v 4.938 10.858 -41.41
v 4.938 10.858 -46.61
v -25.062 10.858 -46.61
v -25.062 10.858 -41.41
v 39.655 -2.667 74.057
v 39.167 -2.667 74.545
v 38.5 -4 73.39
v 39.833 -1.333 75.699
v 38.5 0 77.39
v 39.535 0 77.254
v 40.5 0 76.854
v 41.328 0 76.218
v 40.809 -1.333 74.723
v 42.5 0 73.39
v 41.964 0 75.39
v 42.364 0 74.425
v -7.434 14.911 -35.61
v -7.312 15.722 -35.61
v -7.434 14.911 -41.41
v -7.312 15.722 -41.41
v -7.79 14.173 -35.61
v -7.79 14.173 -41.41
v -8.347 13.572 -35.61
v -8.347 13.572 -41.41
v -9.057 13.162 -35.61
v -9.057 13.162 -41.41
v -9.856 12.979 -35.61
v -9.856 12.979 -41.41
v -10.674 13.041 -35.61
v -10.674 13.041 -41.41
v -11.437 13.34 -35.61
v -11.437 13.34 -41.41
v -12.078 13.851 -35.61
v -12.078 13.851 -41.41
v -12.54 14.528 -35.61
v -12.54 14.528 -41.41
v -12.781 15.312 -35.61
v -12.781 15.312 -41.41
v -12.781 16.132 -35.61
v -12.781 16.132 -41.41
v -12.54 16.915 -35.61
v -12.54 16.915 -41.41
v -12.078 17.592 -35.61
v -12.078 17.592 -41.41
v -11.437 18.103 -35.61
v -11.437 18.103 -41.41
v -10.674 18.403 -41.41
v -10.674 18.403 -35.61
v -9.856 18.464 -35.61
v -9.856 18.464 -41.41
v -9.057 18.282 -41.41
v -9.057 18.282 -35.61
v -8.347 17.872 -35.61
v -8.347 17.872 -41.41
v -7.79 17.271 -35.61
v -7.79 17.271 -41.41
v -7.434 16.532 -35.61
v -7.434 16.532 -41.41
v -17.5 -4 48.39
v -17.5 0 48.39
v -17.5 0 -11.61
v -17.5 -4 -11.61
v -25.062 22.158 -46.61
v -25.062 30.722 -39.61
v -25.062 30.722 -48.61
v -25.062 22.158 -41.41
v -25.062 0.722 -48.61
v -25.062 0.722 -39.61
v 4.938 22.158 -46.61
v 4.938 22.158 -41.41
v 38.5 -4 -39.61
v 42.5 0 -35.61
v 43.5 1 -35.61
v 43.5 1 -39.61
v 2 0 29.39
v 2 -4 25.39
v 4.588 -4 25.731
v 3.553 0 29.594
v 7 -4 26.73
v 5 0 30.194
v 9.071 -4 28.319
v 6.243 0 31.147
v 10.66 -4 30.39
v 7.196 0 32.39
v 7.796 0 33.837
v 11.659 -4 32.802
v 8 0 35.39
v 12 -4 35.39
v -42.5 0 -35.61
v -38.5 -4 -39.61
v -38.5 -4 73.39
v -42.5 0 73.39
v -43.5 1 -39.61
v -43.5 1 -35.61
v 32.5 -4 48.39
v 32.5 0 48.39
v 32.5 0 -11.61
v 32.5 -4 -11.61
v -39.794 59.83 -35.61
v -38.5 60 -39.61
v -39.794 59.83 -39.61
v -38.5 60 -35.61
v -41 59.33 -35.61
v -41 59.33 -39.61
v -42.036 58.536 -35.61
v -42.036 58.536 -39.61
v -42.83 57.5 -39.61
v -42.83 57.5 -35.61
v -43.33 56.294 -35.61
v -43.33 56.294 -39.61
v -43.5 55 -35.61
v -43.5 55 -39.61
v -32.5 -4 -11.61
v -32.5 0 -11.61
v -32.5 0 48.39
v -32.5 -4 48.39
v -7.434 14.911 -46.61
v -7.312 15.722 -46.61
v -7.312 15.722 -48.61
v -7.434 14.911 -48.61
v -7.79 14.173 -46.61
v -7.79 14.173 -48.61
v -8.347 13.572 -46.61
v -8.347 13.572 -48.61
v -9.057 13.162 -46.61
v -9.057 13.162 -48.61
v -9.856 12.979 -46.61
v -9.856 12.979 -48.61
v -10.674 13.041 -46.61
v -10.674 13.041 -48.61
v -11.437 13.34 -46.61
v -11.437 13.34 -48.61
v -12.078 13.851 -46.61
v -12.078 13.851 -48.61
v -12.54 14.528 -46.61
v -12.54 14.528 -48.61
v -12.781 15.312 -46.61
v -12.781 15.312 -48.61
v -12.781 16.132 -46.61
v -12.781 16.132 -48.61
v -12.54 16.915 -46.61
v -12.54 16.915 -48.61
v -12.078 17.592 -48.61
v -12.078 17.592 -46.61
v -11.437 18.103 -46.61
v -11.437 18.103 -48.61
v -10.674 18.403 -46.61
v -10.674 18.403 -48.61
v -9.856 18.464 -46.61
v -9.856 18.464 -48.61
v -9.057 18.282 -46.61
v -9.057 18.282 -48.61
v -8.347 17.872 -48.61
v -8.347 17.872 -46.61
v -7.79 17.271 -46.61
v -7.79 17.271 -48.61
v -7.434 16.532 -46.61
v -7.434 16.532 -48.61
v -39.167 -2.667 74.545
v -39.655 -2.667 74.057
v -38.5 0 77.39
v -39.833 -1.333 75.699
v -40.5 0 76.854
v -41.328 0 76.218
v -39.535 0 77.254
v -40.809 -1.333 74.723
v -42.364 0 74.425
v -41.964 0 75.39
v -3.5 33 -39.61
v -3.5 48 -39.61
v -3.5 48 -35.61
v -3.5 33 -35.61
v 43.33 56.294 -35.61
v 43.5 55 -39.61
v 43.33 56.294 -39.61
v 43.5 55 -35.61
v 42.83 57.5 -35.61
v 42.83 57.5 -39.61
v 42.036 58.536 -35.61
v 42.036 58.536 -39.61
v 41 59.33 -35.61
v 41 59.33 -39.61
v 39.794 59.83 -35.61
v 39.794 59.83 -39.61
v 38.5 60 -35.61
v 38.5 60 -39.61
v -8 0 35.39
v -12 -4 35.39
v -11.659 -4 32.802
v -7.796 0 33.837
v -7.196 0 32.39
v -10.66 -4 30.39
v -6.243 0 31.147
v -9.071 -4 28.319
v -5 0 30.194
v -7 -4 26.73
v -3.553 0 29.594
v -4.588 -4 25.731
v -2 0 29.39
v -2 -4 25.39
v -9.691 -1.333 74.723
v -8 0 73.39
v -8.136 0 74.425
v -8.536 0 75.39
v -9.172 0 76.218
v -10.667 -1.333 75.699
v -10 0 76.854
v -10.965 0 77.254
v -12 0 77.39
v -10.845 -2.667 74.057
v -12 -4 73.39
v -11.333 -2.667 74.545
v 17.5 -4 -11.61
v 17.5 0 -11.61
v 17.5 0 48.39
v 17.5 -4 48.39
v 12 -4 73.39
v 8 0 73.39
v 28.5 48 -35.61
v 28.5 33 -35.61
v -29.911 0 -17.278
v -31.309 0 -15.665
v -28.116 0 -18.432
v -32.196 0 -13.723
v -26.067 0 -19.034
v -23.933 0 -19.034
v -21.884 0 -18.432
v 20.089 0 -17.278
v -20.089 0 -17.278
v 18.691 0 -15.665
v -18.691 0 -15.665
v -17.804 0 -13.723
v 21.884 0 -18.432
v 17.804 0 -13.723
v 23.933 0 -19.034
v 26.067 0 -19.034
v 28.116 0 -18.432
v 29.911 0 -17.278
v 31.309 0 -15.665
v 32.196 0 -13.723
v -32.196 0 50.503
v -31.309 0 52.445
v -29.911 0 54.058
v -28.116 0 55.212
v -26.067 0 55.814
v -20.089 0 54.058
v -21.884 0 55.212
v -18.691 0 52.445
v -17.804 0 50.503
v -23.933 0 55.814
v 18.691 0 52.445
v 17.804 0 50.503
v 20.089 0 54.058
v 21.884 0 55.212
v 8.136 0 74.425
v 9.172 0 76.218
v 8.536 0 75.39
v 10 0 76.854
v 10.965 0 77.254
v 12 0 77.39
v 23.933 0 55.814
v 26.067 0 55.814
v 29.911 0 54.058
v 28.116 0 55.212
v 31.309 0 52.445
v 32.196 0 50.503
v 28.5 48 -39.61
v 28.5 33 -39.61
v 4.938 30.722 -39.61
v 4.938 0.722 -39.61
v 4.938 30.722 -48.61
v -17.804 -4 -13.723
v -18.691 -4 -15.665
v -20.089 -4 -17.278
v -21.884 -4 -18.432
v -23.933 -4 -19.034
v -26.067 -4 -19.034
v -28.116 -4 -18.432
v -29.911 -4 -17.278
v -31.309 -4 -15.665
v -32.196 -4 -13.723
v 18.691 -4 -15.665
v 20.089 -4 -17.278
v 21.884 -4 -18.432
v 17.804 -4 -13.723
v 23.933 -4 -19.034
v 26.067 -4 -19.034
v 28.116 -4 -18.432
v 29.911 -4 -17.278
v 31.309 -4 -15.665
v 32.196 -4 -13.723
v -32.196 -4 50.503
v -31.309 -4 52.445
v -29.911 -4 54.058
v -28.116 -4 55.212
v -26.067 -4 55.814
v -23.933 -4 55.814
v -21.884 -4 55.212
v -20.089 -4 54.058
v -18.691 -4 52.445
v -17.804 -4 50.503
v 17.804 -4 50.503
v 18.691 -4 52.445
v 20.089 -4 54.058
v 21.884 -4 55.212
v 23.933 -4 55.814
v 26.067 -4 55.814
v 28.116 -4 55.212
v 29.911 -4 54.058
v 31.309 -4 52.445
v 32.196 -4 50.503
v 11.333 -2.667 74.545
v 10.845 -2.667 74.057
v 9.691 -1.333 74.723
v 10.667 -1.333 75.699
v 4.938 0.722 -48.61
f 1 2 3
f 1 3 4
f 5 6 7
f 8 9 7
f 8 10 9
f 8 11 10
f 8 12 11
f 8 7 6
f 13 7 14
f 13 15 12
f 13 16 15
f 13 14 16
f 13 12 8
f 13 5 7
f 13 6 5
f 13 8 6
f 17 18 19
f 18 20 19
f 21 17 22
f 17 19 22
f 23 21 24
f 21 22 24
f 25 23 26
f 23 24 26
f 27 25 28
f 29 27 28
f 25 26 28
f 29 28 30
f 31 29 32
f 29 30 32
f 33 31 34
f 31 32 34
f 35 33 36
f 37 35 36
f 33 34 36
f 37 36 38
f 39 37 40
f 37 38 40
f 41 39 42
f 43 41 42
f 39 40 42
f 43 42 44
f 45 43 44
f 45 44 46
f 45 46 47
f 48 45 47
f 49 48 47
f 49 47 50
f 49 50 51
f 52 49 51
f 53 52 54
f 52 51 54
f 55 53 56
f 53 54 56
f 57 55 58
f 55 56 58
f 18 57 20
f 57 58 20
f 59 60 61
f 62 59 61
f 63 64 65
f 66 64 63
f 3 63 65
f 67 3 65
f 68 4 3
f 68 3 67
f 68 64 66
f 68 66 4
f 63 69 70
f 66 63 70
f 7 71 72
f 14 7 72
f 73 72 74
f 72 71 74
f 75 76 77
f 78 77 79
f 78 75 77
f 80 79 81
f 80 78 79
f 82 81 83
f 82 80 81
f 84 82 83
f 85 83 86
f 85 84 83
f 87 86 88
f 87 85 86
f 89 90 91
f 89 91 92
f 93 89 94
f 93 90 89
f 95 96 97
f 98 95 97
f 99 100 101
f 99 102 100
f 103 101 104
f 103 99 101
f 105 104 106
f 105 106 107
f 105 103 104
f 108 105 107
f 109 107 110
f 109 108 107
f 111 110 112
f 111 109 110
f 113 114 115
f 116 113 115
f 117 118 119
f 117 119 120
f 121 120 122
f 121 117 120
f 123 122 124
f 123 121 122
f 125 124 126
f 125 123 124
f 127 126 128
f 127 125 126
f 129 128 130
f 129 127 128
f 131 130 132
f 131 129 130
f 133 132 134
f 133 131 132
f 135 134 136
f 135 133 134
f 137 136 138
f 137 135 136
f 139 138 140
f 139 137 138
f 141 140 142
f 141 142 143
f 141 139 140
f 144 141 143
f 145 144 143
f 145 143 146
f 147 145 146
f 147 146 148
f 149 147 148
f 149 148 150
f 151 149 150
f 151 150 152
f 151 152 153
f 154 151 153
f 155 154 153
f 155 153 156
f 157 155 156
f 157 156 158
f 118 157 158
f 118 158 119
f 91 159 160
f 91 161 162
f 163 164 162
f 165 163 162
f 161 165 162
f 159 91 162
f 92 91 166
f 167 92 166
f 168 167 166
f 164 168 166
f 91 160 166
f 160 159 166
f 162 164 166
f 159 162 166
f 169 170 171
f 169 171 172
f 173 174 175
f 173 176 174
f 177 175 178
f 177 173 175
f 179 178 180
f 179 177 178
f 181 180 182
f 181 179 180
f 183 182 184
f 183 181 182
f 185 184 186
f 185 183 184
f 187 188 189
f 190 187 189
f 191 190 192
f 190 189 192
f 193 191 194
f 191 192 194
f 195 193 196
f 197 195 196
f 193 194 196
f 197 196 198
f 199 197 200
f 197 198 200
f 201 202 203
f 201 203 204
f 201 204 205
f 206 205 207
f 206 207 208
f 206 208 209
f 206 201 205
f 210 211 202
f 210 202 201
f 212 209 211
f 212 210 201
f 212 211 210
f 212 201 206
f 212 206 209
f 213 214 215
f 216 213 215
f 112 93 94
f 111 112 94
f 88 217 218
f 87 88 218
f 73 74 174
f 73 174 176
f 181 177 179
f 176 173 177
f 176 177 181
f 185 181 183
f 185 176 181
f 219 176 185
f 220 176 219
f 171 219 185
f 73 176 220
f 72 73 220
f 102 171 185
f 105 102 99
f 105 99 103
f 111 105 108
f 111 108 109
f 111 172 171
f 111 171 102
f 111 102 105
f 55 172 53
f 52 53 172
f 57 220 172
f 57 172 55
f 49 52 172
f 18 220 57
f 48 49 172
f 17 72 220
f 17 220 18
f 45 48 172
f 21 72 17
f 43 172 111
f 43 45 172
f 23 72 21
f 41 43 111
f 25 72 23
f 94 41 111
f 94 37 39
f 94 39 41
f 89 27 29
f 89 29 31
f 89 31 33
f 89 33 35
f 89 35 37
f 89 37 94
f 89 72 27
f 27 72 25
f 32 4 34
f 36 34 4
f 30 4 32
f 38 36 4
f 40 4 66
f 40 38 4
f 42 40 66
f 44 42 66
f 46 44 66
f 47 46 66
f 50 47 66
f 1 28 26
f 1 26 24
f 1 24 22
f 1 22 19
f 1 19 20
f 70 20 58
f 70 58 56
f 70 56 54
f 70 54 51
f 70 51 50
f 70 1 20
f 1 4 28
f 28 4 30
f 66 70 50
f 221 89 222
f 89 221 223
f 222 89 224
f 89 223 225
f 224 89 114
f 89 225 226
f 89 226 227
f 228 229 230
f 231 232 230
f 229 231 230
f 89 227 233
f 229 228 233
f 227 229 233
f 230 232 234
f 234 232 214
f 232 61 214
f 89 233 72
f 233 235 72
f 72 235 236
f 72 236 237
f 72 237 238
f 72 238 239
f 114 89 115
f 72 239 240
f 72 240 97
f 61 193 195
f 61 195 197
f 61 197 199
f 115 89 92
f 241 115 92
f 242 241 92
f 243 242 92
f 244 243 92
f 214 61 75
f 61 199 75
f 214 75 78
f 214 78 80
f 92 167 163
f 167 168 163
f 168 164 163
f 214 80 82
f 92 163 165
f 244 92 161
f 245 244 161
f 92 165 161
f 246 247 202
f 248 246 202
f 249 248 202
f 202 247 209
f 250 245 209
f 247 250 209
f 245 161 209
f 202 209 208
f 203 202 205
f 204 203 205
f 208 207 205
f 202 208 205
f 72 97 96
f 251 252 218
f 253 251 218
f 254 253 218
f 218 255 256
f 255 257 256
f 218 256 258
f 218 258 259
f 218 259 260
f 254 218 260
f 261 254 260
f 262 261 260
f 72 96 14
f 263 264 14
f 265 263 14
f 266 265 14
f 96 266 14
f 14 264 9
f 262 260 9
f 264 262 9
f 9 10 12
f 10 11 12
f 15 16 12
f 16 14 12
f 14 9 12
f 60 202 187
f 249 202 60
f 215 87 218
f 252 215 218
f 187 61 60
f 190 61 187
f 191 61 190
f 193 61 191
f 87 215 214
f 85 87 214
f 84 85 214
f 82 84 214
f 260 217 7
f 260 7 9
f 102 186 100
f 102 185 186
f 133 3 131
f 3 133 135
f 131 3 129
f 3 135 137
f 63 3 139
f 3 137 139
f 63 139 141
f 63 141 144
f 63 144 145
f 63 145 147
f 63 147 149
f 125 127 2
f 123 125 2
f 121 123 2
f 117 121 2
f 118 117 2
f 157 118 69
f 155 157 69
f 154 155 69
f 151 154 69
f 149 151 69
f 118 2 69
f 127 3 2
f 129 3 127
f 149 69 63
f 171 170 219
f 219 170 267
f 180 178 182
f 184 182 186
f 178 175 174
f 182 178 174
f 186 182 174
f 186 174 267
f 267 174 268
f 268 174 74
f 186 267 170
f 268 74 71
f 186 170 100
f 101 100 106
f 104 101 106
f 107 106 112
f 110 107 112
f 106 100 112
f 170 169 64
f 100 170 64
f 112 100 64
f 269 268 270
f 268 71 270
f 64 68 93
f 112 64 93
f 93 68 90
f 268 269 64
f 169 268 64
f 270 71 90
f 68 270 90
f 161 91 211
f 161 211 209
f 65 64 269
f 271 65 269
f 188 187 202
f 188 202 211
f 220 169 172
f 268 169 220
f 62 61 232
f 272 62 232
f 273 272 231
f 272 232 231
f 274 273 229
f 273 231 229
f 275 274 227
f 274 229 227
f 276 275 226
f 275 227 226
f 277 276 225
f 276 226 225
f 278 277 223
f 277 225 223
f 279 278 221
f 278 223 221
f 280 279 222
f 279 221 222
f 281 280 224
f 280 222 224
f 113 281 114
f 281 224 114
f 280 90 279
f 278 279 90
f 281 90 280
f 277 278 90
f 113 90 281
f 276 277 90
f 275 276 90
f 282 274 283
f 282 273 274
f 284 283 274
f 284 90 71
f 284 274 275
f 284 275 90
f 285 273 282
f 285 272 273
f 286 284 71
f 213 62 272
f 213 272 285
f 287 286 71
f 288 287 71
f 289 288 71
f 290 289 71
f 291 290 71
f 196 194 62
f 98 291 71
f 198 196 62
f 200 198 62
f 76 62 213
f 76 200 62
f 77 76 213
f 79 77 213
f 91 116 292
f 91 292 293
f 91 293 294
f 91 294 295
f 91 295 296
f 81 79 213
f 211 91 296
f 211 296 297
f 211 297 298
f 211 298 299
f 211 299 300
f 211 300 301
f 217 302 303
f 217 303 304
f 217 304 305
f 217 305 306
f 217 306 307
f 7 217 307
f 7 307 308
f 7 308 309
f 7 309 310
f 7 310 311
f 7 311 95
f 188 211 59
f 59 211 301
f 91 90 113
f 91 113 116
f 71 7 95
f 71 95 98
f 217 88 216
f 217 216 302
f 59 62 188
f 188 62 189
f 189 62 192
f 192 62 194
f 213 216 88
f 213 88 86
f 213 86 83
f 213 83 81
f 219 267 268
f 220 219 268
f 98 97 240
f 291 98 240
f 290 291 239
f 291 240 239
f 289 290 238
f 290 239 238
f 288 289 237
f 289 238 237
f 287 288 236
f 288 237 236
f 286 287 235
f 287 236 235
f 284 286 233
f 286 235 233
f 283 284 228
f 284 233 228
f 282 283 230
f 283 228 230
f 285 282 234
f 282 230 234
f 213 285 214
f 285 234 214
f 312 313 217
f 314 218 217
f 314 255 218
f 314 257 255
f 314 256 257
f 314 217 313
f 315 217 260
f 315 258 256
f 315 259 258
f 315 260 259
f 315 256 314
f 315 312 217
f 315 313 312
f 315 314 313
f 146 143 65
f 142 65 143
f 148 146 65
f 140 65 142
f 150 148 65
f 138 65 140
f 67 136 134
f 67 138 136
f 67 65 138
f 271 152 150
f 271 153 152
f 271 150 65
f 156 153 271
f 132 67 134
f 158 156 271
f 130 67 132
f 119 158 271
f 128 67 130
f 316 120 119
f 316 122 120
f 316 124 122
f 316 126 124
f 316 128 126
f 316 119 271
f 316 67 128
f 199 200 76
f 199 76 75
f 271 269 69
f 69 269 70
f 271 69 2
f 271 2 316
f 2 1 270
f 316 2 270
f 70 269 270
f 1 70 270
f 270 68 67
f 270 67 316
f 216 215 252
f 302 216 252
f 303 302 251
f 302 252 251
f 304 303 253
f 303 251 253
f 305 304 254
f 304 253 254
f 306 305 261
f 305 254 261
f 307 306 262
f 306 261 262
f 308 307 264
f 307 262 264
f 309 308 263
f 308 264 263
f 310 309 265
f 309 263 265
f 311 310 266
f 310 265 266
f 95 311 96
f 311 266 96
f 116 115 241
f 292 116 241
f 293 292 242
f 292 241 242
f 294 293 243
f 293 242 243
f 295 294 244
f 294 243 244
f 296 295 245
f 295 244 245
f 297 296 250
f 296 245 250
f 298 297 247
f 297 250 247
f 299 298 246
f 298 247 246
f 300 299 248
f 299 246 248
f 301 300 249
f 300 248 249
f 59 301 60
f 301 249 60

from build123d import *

# Parameters (mm, degrees)
F1_DEPTH      = 4
F2_W          = 87
F2_H          = 4
F3_DEPTH      = 60
F4_W          = 32
F4_H          = 15
F5_DEPTH      = 4
F6_R          = 5
F7_W          = 30
F7_H          = 30
F7_R          = 2.75
F8_DEPTH      = 9
F9_DEPTH      = 5
F10_T1_DEPTH  = 26.5
F10_T3_DEPTH  = 125.8584149398
F10_T5_DEPTH  = 38
F10_T7_DEPTH  = 4
F10_T9_DEPTH  = 26.5
F10_T12_ANGLE = 90
F10_T14_ANGLE = 90
F10_T16_ANGLE = 90
F10_T18_ANGLE = 90
F10_T20_ANGLE = 90
F10_T22_ANGLE = 90
F11_W         = 11.3
F11_H         = 5.2
F12_DEPTH     = 30.7


# Not quite as in the source:
# - a fillet or chamfer that OpenCascade refuses, or shapes differently, is made with other operations: its cross-section is extruded or revolved along the edge and cut away or added


with BuildPart() as f1:
    # F0 (on Front) → F1 (new body)
    with BuildSketch(Plane.XZ):
        Polygon((-7, 78.3899563551), (-43.5, 78.3899563551), (-43.5, -39.6100436449), (43.5, -39.6100436449), (43.5, 78.3899563551), (7, 78.3899563551), (7, 30.3899563551), (-7, 30.3899563551), align=None)
        with BuildLine():
            Line((-17.5, 48.3899563551), (-17.5, -11.6100436449))
            ThreePointArc((-17.5, -11.6100436449), (-25, -19.1100436449), (-32.5, -11.6100436449))
            Line((-32.5, -11.6100436449), (-32.5, 48.3899563551))
            ThreePointArc((-32.5, 48.3899563551), (-25, 55.8899563551), (-17.5, 48.3899563551))
        make_face(mode=Mode.SUBTRACT)
        with BuildLine():
            Line((32.5, 48.3899563551), (32.5, -11.6100436449))
            ThreePointArc((32.5, -11.6100436449), (25, -19.1100436449), (17.5, -11.6100436449))
            Line((17.5, -11.6100436449), (17.5, 48.3899563551))
            ThreePointArc((17.5, 48.3899563551), (25, 55.8899563551), (32.5, 48.3899563551))
        make_face(mode=Mode.SUBTRACT)
    extrude(amount=F1_DEPTH)

    # F2 (on face) → F3 (join)
    with BuildSketch(Plane(origin=(0, 0, 0), x_dir=(-1, 0, 0), z_dir=(0, 1, 0))):
        with Locations((0, -37.6100436449)):
            Rectangle(F2_W, F2_H)
    extrude(amount=F3_DEPTH)

    # F4 (on face) → F5 (cut)
    with BuildSketch(Plane(origin=(0, 0, -39.6100436449), x_dir=(1, 0, 0), z_dir=(0, 0, -1))):
        with Locations((12.5, -40.5)):
            Rectangle(F4_W, F4_H)
    extrude(amount=-F5_DEPTH, mode=Mode.SUBTRACT)

    # F6
    f6_edges = [f1.edges().sort_by_distance(p)[0] for p in [
        (-43.5, -2, 78.389956),
        (7, -2, 78.389956),
        (-7, -2, 78.389956),
        (43.5, -2, 78.389956),
        (-43.5, 60, -37.610044),
        (43.5, 60, -37.610044),
        (7, -2, 30.389956),
        (-7, -2, 30.389956),
    ]]
    fillet(f6_edges, radius=F6_R)

    # F7 (on face) → F8 (join)
    with BuildSketch(Plane(origin=(0, 0, -39.6100436449), x_dir=(1, 0, 0), z_dir=(0, 0, -1))):
        with Locations((-10.0618535653, -15.7216744063)):
            Rectangle(F7_W, F7_H)
        with Locations((-10.0618535653, -15.7216744063)):
            Circle(F7_R, mode=Mode.SUBTRACT)
    extrude(amount=F8_DEPTH)

    # F9 (cut): a face of the model
    f9_faces = [f1.faces().sort_by_distance(p)[0] for p in [
        (-10.0618535653, 15.7216744063, -39.6100436449),
    ]]
    extrude(f9_faces, amount=-F9_DEPTH, mode=Mode.SUBTRACT)

    # F10: chamfer of 5 on 1 edges, made by hand

    # F10_s2 → F10_t1 (cut)
    with BuildSketch(Plane.YZ.offset(-38.5)):
        Polygon((-4, 73.3899563551), (1, 78.3899563551), (-4, 78.3899563551), align=None)
    extrude(amount=F10_T1_DEPTH, mode=Mode.SUBTRACT)

    # F10_s4 → F10_t3 (cut)
    with BuildSketch(Plane.XY.offset(-52.4684585847)):
        Polygon((-38.5, -4), (-43.5, 1), (-43.5, -4), align=None)
        Polygon((38.5, -4), (43.5, 1), (43.5, -4), align=None)
    extrude(amount=F10_T3_DEPTH, mode=Mode.SUBTRACT)

    # F10_s6 → F10_t5 (cut)
    with BuildSketch(Plane.XY.offset(35.3899563551)):
        Polygon((-7, 1), (-12, -4), (-7, -4), align=None)
        Polygon((12, -4), (7, 1), (7, -4), align=None)
    extrude(amount=F10_T5_DEPTH, mode=Mode.SUBTRACT)

    # F10_s8 → F10_t7 (cut)
    with BuildSketch(Plane.YZ.offset(-2)):
        Polygon((-4, 25.3899563551), (1, 30.3899563551), (-4, 30.3899563551), align=None)
    extrude(amount=F10_T7_DEPTH, mode=Mode.SUBTRACT)

    # F10_s10 → F10_t9 (cut)
    with BuildSketch(Plane.YZ.offset(12)):
        Polygon((-4, 73.3899563551), (1, 78.3899563551), (-4, 78.3899563551), align=None)
    extrude(amount=F10_T9_DEPTH, mode=Mode.SUBTRACT)

    # F10_s11 → F10_t12 (revolve, cut)
    with BuildSketch(Plane.XY.offset(73.3899563551)):
        Polygon((-7, 1), (-12, -4), (-7, -4), align=None)
    revolve(axis=Axis((-12, -4, 73.3899563551), (0, -1, 0)), revolution_arc=F10_T12_ANGLE, mode=Mode.SUBTRACT)

    # F10_s13 → F10_t14 (revolve, cut)
    with BuildSketch(Plane.YZ.offset(-38.5)):
        Polygon((-4, 73.3899563551), (1, 78.3899563551), (-4, 78.3899563551), align=None)
    revolve(axis=Axis((-38.5, -4, 73.3899563551), (0, -1, 0)), revolution_arc=F10_T14_ANGLE, mode=Mode.SUBTRACT)

    # F10_s15 → F10_t16 (revolve, cut)
    with BuildSketch(Plane.XY.offset(35.3899563551)):
        Polygon((-7, 1), (-12, -4), (-7, -4), align=None)
    revolve(axis=Axis((-2, -4, 35.3899563551), (0, -1, 0)), revolution_arc=F10_T16_ANGLE, mode=Mode.SUBTRACT)

    # F10_s17 → F10_t18 (revolve, cut)
    with BuildSketch(Plane.YZ.offset(2)):
        Polygon((-4, 25.3899563551), (1, 30.3899563551), (-4, 30.3899563551), align=None)
    revolve(axis=Axis((2, -4, 35.3899563551), (0, -1, 0)), revolution_arc=F10_T18_ANGLE, mode=Mode.SUBTRACT)

    # F10_s19 → F10_t20 (revolve, cut)
    with BuildSketch(Plane.XY.offset(73.3899563551)):
        Polygon((12, -4), (7, 1), (7, -4), align=None)
    revolve(axis=Axis((12, -4, 73.3899563551), (0, 1, 0)), revolution_arc=F10_T20_ANGLE, mode=Mode.SUBTRACT)

    # F10_s21 → F10_t22 (revolve, cut)
    with BuildSketch(Plane.YZ.offset(38.5)):
        Polygon((-4, 73.3899563551), (1, 78.3899563551), (-4, 78.3899563551), align=None)
    revolve(axis=Axis((38.5, -4, 73.3899563551), (0, 1, 0)), revolution_arc=F10_T22_ANGLE, mode=Mode.SUBTRACT)

    # F11 (on face) → F12 (cut)
    with BuildSketch(Plane.YZ.offset(4.9381464347)):
        with Locations((16.5075063076, -44.0100436449)):
            Rectangle(F11_W, F11_H)
    extrude(amount=-F12_DEPTH, mode=Mode.SUBTRACT)


solid = f1.part
